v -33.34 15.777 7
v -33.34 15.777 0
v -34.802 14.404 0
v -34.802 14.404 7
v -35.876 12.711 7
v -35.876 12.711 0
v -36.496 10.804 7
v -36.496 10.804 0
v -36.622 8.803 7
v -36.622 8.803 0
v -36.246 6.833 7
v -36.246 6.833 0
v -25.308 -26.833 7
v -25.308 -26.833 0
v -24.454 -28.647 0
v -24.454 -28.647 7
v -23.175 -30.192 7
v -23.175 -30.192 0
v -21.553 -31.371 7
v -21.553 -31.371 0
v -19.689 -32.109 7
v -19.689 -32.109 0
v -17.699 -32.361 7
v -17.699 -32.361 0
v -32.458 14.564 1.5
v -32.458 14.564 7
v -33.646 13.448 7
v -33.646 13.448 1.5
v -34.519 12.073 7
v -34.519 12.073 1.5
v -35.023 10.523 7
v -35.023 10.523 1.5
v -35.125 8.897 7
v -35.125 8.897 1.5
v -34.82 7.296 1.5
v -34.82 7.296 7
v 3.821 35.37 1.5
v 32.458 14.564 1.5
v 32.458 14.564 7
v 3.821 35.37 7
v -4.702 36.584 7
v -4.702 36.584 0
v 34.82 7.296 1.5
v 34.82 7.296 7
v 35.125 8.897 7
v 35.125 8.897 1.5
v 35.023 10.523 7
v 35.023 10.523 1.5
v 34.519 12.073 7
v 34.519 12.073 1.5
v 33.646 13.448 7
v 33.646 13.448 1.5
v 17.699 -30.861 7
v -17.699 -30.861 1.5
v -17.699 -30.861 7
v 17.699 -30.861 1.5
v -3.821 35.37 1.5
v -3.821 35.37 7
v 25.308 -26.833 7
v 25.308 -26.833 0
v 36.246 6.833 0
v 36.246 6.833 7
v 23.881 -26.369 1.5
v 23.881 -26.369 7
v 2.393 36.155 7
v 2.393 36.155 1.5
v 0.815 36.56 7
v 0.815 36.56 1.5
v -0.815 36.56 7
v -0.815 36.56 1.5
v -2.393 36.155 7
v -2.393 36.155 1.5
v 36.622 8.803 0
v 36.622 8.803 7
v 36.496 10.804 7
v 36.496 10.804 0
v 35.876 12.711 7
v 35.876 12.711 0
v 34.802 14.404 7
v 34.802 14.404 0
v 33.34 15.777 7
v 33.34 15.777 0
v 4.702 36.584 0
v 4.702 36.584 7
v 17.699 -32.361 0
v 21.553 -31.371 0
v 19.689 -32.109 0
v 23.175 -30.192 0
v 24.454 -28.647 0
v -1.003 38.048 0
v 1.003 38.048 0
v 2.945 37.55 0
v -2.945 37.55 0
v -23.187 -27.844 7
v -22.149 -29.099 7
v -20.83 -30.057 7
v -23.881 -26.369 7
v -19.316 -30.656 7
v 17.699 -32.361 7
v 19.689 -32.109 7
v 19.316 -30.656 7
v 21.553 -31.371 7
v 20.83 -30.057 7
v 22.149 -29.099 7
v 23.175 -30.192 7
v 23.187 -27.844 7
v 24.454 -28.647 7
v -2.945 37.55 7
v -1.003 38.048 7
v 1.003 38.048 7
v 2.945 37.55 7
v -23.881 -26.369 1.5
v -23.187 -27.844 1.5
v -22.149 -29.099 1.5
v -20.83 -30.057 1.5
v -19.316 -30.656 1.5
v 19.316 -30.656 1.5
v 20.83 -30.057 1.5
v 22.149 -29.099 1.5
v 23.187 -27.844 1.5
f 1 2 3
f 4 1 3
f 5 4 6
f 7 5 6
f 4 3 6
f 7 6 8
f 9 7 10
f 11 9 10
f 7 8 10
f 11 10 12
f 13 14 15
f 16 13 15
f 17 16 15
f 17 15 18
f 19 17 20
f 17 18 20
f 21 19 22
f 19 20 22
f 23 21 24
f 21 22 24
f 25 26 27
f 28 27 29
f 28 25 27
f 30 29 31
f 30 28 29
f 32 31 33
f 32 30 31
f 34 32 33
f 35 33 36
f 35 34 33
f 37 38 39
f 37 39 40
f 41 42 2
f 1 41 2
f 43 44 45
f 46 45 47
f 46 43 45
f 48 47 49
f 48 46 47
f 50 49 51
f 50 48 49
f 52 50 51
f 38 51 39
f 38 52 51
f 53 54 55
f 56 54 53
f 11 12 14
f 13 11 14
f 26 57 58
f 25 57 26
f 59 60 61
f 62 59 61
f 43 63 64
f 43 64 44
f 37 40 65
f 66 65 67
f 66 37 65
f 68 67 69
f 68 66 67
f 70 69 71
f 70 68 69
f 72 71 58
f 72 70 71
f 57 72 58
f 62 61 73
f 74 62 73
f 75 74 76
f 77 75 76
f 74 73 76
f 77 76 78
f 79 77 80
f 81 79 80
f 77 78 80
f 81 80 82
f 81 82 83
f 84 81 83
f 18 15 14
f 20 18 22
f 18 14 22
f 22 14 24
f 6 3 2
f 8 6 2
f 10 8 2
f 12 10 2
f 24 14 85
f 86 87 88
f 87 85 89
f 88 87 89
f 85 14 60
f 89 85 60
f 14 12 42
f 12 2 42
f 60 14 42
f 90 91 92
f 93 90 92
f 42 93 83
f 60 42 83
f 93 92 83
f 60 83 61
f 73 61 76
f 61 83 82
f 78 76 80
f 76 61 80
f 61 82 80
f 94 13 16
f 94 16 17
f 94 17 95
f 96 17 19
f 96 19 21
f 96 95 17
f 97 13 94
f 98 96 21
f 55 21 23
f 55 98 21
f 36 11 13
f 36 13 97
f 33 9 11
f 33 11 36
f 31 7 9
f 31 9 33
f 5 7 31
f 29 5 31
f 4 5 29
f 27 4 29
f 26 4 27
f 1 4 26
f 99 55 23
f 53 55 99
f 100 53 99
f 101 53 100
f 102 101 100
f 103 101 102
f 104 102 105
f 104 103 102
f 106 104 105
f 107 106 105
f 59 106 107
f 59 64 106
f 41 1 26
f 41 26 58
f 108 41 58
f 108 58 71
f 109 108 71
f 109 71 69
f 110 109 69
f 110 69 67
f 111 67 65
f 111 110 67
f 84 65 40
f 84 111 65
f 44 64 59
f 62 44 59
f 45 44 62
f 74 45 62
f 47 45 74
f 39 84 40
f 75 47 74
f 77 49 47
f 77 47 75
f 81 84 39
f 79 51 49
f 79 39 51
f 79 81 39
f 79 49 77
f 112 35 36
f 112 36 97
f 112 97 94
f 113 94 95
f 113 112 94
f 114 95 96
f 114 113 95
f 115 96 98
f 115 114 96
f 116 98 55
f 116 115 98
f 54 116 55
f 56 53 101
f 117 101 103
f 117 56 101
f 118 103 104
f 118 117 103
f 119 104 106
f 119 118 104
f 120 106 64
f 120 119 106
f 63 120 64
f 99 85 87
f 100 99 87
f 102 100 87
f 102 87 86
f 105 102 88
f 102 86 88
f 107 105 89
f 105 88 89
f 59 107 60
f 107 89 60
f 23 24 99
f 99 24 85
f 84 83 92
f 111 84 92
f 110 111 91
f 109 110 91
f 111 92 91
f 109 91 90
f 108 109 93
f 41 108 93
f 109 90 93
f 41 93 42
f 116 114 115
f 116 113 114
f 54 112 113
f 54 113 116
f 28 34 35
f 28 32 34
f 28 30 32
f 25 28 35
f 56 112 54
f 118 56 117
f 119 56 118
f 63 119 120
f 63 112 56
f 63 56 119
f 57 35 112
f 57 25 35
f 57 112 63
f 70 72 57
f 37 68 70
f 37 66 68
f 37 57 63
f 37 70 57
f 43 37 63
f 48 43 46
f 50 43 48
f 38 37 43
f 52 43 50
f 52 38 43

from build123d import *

# Parameters (mm, degrees)
F3_DEPTH = 7
F4_T     = -1.5


with BuildPart() as f3:
    # F2 (on Top) → F3 (new body)
    with BuildSketch(Plane.XY):
        with BuildLine():
            Line((25.307521998, -26.83281573), (36.2461487455, 6.83281573))
            ThreePointArc((36.2461487455, 6.83281573), (36.2461487455, 11.77708764), (33.3399786335, 15.77708764))
            Line((33.3399786335, 15.77708764), (4.7022820183, 36.583592135))
            ThreePointArc((4.7022820183, 36.583592135), (0, 38.11145618), (-4.7022820183, 36.583592135))
            Line((-4.7022820183, 36.583592135), (-33.3399786335, 15.77708764))
            ThreePointArc((-33.3399786335, 15.77708764), (-36.2461487455, 11.77708764), (-36.2461487455, 6.83281573))
            Line((-36.2461487455, 6.83281573), (-25.307521998, -26.83281573))
            ThreePointArc((-25.307521998, -26.83281573), (-22.401351886, -30.83281573), (-17.6990698677, -32.360679775))
            Line((-17.6990698677, -32.360679775), (17.6990698677, -32.360679775))
            ThreePointArc((17.6990698677, -32.360679775), (22.401351886, -30.83281573), (25.307521998, -26.83281573))
        make_face()
    extrude(amount=F3_DEPTH)

    # F4
    f4_openings = [f3.faces().sort_by_distance(p)[0] for p in [
        (0, 0, 7),
    ]]
    offset(amount=F4_T, openings=f4_openings)


solid = f3.part
